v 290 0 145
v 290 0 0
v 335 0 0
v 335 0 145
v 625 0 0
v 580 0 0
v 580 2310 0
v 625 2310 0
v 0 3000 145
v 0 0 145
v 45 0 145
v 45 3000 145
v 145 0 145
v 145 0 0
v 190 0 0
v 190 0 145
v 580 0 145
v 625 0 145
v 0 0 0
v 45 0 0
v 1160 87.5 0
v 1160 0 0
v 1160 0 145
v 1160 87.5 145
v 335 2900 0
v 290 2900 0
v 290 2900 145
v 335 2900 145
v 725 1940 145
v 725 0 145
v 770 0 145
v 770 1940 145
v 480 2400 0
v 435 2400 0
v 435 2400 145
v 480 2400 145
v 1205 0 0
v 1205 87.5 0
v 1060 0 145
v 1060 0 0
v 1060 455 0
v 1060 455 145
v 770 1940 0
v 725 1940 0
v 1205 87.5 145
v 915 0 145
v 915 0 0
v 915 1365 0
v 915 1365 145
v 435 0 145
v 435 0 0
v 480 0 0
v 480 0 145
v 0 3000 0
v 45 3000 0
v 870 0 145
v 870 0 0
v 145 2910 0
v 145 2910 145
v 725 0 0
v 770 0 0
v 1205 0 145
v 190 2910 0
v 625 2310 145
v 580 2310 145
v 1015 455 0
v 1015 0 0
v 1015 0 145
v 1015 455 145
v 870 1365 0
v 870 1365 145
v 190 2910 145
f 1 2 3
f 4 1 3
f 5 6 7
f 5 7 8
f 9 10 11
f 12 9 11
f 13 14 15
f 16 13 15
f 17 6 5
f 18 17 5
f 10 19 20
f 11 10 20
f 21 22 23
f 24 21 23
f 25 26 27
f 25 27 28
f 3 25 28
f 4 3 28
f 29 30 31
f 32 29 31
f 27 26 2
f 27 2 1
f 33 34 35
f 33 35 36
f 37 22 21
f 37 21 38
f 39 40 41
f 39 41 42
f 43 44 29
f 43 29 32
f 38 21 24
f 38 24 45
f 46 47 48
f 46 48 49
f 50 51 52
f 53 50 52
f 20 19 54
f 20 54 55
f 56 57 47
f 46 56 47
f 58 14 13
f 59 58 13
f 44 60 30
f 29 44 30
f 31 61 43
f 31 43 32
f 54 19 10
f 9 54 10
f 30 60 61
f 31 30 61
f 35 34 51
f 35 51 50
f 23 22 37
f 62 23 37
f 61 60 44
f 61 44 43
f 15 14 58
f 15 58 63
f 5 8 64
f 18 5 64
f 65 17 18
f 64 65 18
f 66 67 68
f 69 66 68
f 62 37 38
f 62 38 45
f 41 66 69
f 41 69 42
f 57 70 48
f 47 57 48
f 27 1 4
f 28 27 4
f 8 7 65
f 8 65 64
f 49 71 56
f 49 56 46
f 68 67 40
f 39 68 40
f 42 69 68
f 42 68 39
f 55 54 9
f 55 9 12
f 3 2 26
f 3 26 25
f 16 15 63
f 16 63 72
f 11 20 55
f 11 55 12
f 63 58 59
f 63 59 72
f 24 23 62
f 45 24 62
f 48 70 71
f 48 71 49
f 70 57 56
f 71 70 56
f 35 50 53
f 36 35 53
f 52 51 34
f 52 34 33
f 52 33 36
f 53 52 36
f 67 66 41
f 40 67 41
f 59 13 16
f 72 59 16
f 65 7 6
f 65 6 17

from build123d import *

# Parameters (mm, degrees)
F0_W     = 45
F0_H     = 145
F1_DEPTH = 3000
F2_DEPTH = 2910
F3_DEPTH = 2900
F4_DEPTH = 2400
F5_DEPTH = 2310
F6_DEPTH = 1365
F7_DEPTH = 455
F8_DEPTH = 87.5
F9_DEPTH = 1940


with BuildPart() as f1:
    # F0 (on Front) → F1 (new body)
    with BuildSketch(Plane.XZ):
        with Locations((22.5, 72.5)):
            Rectangle(F0_W, F0_H)
    extrude(amount=-F1_DEPTH)


with BuildPart() as f2:
    # F0 (on Front) → F2 (new body)
    with BuildSketch(Plane.XZ):
        with Locations((167.5, 72.5)):
            Rectangle(F0_W, F0_H)
    extrude(amount=-F2_DEPTH)


with BuildPart() as f3:
    # F0 (on Front) → F3 (new body)
    with BuildSketch(Plane.XZ):
        with Locations((312.5, 72.5)):
            Rectangle(F0_W, F0_H)
    extrude(amount=-F3_DEPTH)


with BuildPart() as f4:
    # F0 (on Front) → F4 (new body)
    with BuildSketch(Plane.XZ):
        with Locations((457.5, 72.5)):
            Rectangle(F0_W, F0_H)
    extrude(amount=-F4_DEPTH)


with BuildPart() as f5:
    # F0 (on Front) → F5 (new body)
    with BuildSketch(Plane.XZ):
        with Locations((602.5, 72.5)):
            Rectangle(F0_W, F0_H)
    extrude(amount=-F5_DEPTH)


with BuildPart() as f6:
    # F0 (on Front) → F6 (new body)
    with BuildSketch(Plane.XZ):
        with Locations((892.5, 72.5)):
            Rectangle(F0_W, F0_H)
    extrude(amount=-F6_DEPTH)


with BuildPart() as f7:
    # F0 (on Front) → F7 (new body)
    with BuildSketch(Plane.XZ):
        with Locations((1037.5, 72.5)):
            Rectangle(F0_W, F0_H)
    extrude(amount=-F7_DEPTH)


with BuildPart() as f8:
    # F0 (on Front) → F8 (new body)
    with BuildSketch(Plane.XZ):
        with Locations((1182.5, 72.5)):
            Rectangle(F0_W, F0_H)
    extrude(amount=-F8_DEPTH)


with BuildPart() as f9:
    # F0 (on Front) → F9 (new body)
    with BuildSketch(Plane.XZ):
        with Locations((747.5, 72.5)):
            Rectangle(F0_W, F0_H)
    extrude(amount=-F9_DEPTH)


solid = Compound([f1.part, f2.part, f3.part, f4.part, f5.part, f6.part, f7.part, f8.part, f9.part])
